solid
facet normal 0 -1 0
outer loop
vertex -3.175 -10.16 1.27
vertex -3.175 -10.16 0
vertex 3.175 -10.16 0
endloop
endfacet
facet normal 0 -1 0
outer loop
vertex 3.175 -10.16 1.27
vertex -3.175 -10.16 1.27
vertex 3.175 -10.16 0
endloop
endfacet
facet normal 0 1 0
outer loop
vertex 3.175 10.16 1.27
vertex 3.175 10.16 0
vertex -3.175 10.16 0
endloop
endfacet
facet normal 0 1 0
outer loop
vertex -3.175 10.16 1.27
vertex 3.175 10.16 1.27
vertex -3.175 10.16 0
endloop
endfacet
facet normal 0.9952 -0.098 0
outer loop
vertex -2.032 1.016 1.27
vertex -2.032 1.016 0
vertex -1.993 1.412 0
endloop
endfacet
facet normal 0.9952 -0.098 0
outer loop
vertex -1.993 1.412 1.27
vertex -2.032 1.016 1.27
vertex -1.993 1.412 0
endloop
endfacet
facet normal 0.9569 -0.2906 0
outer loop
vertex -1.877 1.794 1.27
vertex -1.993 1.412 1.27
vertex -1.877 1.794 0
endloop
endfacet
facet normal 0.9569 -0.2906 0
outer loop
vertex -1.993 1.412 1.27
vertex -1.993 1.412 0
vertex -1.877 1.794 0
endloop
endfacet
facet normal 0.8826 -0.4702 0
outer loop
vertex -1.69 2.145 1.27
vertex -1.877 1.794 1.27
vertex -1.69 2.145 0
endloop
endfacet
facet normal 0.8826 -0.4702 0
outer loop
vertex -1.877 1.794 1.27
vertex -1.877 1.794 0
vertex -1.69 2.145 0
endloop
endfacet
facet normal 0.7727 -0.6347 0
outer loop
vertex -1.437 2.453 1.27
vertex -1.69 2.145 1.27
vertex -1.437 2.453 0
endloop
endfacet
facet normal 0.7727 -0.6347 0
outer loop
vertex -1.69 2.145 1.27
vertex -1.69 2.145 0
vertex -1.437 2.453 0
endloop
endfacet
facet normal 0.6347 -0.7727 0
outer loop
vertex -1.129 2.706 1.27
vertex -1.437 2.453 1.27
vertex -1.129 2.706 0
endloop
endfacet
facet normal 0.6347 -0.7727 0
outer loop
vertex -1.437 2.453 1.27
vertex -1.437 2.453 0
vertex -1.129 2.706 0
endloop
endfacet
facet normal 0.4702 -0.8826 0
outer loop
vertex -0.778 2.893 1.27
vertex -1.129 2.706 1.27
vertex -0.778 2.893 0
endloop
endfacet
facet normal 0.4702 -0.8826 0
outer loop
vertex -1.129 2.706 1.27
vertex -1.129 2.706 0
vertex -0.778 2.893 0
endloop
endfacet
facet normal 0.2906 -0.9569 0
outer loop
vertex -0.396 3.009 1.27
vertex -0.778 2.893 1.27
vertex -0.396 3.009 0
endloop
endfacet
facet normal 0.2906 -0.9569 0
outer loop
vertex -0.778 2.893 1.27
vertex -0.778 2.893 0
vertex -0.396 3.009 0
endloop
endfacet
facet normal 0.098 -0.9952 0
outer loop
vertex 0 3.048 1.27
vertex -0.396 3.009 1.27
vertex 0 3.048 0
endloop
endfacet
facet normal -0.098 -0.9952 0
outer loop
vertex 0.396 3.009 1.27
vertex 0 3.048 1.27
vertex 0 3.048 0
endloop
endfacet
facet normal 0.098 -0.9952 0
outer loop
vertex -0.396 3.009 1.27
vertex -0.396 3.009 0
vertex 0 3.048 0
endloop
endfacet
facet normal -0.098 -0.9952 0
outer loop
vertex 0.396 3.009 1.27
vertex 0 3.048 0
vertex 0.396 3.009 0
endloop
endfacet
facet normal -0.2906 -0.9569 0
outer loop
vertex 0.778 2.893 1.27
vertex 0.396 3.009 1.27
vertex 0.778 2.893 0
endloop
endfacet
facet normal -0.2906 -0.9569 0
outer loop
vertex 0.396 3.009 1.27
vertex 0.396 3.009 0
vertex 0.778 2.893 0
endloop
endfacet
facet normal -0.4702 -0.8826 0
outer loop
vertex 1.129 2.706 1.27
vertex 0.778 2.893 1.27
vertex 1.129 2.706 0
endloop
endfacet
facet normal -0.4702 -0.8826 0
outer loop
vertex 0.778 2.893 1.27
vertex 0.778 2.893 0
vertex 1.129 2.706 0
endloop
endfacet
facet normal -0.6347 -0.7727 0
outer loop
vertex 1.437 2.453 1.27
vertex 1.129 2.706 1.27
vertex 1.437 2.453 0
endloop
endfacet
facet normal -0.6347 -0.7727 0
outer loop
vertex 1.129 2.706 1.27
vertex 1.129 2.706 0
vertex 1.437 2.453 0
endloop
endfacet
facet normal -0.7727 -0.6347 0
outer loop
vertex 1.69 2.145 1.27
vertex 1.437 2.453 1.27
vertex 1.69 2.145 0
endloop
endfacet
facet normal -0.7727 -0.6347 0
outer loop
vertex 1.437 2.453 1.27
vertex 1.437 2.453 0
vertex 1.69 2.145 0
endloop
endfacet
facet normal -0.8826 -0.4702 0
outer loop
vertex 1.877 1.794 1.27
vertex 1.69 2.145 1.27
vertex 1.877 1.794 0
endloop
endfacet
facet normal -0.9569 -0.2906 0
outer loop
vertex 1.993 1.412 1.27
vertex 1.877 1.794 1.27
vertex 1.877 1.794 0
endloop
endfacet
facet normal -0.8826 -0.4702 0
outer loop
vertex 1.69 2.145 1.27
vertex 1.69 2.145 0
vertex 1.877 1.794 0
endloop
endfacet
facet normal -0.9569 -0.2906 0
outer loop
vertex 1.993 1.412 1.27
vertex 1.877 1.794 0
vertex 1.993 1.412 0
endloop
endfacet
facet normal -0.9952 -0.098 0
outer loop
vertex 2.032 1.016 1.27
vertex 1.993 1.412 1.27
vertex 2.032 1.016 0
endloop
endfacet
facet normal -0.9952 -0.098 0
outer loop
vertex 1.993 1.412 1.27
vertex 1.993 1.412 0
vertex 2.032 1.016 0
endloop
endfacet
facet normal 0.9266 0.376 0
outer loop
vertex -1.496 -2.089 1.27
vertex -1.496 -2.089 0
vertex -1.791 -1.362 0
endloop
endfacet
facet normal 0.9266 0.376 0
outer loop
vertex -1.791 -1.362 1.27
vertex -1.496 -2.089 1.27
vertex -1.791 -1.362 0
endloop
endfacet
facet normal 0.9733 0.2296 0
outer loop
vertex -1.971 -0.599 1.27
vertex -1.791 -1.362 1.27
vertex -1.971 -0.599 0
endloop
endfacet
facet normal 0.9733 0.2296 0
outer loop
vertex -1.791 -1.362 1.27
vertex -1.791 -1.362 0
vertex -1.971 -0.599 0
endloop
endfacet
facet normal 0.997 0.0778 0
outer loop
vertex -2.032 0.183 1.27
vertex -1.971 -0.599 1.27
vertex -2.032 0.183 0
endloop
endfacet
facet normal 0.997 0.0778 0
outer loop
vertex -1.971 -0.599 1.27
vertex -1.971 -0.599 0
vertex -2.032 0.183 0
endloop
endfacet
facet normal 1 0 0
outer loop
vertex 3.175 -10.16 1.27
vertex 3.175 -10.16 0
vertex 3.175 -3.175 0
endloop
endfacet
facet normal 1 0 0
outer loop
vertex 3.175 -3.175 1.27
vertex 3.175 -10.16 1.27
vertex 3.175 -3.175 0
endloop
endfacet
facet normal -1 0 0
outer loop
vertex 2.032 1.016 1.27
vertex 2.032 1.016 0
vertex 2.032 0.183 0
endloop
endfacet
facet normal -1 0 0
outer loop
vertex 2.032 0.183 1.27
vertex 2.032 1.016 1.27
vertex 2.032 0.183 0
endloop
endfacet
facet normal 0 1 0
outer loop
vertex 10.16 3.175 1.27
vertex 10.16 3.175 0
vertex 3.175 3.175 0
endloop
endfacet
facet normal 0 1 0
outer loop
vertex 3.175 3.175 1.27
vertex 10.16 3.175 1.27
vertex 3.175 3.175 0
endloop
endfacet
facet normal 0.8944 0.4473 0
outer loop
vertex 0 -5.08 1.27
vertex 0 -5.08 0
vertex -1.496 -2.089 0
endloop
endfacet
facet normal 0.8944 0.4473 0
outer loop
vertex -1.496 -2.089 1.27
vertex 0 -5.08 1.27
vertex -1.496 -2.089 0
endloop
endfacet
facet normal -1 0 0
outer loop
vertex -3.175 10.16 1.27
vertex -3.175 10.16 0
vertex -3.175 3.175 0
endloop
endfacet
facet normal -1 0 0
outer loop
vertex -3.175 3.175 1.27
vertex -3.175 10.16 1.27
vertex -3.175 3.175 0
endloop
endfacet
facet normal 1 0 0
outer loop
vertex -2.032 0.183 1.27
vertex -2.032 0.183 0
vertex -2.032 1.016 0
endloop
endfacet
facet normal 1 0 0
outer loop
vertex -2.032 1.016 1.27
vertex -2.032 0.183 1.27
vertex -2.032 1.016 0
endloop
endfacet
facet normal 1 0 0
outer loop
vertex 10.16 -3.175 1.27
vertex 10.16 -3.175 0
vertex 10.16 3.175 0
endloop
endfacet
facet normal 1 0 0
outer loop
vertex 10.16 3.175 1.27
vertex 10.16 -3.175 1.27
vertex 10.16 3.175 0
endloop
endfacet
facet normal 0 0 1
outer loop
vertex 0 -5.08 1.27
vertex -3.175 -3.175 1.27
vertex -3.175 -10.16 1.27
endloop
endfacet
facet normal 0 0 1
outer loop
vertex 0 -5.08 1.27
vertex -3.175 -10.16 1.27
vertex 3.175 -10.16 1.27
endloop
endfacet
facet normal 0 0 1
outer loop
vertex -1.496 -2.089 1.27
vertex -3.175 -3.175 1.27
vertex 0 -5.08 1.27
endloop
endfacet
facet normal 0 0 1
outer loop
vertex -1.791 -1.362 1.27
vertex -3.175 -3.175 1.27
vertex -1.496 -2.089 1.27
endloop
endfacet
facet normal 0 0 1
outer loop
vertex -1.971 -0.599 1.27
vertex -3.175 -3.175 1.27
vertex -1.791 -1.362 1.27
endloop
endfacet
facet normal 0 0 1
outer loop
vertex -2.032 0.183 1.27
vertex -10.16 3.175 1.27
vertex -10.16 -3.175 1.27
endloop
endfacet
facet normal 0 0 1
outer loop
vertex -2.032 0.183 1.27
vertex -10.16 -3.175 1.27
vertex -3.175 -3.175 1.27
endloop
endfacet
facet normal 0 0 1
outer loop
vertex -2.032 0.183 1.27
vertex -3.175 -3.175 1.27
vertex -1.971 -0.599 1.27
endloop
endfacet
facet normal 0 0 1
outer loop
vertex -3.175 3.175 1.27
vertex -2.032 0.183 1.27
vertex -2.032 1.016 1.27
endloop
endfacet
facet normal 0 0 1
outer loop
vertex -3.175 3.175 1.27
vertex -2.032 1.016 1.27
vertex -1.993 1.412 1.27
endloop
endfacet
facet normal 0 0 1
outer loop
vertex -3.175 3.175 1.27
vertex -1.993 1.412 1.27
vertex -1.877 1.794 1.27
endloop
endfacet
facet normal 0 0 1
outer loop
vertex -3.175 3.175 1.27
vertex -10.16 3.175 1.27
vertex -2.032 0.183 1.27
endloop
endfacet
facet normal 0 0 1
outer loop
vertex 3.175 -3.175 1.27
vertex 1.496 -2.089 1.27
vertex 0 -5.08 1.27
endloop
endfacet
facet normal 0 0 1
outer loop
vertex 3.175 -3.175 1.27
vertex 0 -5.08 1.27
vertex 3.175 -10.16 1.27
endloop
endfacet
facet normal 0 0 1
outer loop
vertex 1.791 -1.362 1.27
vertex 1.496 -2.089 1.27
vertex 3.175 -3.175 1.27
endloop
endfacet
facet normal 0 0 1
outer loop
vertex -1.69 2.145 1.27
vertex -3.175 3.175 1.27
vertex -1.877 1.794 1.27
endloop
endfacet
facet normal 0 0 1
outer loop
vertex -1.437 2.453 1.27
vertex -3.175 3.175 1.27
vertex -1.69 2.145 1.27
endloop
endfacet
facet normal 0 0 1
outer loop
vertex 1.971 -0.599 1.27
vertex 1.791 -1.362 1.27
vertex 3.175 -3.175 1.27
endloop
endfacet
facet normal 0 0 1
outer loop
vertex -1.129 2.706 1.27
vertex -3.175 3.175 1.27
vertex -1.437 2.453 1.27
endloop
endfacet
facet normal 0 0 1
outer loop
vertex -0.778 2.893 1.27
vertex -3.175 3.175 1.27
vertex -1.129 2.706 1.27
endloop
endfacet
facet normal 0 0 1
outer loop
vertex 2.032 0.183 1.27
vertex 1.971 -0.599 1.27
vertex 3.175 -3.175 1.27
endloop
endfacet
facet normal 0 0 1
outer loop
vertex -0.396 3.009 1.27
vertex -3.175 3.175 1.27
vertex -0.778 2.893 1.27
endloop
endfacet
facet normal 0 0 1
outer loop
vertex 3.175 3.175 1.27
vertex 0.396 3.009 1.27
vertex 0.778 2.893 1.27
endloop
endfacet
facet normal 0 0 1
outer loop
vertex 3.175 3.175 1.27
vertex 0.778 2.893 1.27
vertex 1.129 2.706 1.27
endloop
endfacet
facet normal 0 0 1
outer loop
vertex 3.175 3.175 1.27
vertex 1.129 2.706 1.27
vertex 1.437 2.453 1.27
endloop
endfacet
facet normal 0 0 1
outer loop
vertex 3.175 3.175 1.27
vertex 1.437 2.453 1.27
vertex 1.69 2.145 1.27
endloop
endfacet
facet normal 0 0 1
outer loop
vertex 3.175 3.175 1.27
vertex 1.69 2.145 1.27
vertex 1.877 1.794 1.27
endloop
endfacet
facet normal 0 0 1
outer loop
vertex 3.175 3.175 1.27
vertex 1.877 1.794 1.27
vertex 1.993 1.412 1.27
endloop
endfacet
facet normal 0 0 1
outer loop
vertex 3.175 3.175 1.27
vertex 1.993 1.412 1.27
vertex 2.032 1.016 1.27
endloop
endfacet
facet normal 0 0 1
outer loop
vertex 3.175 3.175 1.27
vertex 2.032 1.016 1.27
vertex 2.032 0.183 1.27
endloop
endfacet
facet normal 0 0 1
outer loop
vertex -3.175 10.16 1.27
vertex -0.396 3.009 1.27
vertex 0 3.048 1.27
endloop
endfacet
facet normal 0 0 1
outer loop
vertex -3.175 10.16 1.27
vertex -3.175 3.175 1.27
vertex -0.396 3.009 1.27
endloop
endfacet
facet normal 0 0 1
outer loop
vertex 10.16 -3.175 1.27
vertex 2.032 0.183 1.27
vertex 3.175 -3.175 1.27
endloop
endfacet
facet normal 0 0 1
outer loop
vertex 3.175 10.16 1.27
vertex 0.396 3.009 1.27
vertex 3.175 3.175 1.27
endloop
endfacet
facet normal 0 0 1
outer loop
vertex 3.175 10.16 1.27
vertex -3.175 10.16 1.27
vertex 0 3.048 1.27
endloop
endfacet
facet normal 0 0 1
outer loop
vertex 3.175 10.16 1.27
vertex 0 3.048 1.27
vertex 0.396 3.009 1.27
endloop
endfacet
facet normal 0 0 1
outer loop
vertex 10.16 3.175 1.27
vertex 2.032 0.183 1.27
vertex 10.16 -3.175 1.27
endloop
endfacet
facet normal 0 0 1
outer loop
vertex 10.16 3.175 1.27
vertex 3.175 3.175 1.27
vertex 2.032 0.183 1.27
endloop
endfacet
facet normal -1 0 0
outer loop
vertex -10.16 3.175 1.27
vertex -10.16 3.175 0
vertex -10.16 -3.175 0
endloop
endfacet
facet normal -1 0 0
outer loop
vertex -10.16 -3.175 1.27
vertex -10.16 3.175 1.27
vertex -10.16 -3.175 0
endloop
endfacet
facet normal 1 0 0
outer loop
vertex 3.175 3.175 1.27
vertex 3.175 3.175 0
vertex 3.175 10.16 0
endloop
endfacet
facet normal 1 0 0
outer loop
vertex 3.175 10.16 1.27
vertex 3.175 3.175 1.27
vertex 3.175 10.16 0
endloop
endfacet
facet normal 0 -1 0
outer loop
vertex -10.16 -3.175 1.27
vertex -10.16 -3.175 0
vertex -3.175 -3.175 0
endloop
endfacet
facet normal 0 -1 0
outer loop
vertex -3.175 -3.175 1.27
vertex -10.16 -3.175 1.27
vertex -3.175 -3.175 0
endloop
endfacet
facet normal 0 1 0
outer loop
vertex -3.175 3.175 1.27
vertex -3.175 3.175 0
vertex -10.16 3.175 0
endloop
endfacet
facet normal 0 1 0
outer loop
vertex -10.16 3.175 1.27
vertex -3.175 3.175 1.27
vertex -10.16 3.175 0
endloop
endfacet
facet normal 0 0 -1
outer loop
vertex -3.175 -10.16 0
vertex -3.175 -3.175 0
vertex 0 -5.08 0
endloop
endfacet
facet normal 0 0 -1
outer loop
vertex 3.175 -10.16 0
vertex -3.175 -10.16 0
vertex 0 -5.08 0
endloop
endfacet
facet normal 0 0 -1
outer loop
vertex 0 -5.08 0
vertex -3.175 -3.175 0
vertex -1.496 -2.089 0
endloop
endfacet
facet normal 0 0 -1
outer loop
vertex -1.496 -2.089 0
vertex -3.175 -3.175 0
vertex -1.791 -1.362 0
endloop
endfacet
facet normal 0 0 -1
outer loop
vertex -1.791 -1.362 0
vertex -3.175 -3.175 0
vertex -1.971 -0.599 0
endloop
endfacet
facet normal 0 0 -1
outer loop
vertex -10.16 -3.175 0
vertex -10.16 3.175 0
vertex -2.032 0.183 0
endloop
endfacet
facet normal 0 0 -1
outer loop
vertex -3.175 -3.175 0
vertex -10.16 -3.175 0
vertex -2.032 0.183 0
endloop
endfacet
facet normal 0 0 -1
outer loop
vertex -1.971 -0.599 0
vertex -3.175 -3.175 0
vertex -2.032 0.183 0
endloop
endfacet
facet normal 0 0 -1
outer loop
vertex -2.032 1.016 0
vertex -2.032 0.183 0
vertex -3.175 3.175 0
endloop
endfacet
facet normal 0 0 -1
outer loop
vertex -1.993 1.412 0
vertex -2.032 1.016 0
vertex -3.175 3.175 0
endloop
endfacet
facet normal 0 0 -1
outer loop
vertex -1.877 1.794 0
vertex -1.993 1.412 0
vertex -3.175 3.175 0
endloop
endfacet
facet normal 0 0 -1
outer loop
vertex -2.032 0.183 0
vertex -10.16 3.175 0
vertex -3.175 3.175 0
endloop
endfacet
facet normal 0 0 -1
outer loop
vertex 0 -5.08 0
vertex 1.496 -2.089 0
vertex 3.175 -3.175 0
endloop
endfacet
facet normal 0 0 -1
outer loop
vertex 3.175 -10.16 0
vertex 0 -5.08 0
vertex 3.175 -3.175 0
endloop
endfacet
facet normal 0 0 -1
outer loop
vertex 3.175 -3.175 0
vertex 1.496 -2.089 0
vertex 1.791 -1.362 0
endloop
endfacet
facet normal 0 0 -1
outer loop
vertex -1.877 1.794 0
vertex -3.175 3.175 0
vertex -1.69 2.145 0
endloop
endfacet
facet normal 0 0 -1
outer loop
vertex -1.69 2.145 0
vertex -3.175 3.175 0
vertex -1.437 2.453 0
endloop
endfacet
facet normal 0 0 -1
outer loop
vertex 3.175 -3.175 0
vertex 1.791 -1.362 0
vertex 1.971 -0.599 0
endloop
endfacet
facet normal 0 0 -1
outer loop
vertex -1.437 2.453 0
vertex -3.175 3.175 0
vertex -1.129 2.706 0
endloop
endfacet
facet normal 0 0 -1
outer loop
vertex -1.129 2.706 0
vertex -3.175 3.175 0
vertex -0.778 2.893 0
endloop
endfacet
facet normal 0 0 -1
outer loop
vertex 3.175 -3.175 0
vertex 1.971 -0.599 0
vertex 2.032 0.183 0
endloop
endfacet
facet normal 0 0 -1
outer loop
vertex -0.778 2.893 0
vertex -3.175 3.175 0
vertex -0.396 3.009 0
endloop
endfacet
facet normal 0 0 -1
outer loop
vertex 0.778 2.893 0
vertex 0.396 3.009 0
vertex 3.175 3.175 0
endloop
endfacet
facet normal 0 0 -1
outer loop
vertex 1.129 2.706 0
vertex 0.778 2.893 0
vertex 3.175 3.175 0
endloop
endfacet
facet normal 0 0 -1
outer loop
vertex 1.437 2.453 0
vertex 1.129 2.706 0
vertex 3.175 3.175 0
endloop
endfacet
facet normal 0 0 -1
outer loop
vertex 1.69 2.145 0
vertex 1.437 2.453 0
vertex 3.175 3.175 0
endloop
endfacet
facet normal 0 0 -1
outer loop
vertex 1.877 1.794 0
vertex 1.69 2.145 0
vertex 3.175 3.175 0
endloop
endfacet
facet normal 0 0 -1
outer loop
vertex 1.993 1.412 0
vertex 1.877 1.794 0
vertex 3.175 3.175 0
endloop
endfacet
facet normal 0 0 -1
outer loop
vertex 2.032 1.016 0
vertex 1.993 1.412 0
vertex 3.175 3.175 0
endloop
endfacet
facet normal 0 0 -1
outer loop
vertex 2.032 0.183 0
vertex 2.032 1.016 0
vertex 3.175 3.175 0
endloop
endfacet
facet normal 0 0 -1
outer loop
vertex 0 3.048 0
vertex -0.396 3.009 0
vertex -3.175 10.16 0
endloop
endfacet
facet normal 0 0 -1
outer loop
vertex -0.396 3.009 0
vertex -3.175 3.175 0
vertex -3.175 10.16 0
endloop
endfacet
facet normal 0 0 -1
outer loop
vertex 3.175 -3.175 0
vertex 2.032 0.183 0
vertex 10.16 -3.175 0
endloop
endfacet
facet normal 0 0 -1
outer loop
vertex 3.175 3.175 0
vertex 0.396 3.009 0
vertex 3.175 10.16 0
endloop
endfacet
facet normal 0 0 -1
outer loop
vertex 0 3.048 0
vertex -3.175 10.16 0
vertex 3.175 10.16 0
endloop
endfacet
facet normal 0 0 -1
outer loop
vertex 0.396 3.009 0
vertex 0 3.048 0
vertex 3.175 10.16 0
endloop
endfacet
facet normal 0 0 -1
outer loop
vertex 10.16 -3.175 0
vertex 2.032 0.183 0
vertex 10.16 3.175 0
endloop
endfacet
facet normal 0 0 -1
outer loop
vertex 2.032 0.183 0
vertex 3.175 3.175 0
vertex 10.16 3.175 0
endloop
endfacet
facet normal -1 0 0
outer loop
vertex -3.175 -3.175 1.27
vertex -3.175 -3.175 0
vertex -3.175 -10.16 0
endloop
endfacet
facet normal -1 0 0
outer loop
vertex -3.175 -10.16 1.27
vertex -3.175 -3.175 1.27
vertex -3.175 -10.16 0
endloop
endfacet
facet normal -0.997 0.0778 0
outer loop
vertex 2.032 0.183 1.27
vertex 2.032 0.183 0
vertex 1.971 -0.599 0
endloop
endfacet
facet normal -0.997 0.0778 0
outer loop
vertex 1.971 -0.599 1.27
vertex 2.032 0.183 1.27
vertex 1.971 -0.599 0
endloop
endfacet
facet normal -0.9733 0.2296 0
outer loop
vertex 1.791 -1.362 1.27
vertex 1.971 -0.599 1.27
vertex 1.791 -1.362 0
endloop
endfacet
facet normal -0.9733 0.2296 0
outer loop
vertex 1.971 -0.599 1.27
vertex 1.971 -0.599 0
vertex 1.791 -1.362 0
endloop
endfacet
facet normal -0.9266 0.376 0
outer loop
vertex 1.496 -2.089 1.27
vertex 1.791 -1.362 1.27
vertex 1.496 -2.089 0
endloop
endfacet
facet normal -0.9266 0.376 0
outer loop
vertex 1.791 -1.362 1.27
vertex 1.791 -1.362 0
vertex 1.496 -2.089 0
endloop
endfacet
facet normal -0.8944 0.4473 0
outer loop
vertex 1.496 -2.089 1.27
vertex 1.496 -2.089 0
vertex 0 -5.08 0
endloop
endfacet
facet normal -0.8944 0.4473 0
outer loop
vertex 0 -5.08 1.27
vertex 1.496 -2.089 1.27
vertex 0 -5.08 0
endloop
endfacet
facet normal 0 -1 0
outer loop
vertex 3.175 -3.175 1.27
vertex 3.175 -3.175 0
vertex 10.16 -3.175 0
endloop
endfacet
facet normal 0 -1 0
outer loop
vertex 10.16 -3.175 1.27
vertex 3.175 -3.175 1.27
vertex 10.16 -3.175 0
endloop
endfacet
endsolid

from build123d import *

# Parameters (mm, degrees)
F1_DEPTH = 1.27


with BuildPart() as f1:
    # F0 (on Top) → F1 (new body)
    with BuildSketch(Plane.XY):
        Polygon((3.175, 10.16), (-3.175, 10.16), (-3.175, 3.175), (-10.16, 3.175), (-10.16, -3.175), (-3.175, -3.175), (-3.175, -10.16), (3.175, -10.16), (3.175, -3.175), (10.16, -3.175), (10.16, 3.175), (3.175, 3.175), align=None)
        with BuildLine():
            Line((-2.032, 0.183225), (-2.032, 1.016))
            ThreePointArc((-2.032, 1.016), (0, 3.048), (2.032, 1.016))
            Line((2.032, 1.016), (2.032, 0.183225))
            ThreePointArc((2.032, 0.183225), (1.896105, -0.98392), (1.49569, -2.08862))
            Line((1.49569, -2.08862), (0, -5.08))
            Line((0, -5.08), (-1.49569, -2.08862))
            ThreePointArc((-1.49569, -2.08862), (-1.896105, -0.98392), (-2.032, 0.183225))
        make_face(mode=Mode.SUBTRACT)
    extrude(amount=F1_DEPTH)


solid = f1.part
